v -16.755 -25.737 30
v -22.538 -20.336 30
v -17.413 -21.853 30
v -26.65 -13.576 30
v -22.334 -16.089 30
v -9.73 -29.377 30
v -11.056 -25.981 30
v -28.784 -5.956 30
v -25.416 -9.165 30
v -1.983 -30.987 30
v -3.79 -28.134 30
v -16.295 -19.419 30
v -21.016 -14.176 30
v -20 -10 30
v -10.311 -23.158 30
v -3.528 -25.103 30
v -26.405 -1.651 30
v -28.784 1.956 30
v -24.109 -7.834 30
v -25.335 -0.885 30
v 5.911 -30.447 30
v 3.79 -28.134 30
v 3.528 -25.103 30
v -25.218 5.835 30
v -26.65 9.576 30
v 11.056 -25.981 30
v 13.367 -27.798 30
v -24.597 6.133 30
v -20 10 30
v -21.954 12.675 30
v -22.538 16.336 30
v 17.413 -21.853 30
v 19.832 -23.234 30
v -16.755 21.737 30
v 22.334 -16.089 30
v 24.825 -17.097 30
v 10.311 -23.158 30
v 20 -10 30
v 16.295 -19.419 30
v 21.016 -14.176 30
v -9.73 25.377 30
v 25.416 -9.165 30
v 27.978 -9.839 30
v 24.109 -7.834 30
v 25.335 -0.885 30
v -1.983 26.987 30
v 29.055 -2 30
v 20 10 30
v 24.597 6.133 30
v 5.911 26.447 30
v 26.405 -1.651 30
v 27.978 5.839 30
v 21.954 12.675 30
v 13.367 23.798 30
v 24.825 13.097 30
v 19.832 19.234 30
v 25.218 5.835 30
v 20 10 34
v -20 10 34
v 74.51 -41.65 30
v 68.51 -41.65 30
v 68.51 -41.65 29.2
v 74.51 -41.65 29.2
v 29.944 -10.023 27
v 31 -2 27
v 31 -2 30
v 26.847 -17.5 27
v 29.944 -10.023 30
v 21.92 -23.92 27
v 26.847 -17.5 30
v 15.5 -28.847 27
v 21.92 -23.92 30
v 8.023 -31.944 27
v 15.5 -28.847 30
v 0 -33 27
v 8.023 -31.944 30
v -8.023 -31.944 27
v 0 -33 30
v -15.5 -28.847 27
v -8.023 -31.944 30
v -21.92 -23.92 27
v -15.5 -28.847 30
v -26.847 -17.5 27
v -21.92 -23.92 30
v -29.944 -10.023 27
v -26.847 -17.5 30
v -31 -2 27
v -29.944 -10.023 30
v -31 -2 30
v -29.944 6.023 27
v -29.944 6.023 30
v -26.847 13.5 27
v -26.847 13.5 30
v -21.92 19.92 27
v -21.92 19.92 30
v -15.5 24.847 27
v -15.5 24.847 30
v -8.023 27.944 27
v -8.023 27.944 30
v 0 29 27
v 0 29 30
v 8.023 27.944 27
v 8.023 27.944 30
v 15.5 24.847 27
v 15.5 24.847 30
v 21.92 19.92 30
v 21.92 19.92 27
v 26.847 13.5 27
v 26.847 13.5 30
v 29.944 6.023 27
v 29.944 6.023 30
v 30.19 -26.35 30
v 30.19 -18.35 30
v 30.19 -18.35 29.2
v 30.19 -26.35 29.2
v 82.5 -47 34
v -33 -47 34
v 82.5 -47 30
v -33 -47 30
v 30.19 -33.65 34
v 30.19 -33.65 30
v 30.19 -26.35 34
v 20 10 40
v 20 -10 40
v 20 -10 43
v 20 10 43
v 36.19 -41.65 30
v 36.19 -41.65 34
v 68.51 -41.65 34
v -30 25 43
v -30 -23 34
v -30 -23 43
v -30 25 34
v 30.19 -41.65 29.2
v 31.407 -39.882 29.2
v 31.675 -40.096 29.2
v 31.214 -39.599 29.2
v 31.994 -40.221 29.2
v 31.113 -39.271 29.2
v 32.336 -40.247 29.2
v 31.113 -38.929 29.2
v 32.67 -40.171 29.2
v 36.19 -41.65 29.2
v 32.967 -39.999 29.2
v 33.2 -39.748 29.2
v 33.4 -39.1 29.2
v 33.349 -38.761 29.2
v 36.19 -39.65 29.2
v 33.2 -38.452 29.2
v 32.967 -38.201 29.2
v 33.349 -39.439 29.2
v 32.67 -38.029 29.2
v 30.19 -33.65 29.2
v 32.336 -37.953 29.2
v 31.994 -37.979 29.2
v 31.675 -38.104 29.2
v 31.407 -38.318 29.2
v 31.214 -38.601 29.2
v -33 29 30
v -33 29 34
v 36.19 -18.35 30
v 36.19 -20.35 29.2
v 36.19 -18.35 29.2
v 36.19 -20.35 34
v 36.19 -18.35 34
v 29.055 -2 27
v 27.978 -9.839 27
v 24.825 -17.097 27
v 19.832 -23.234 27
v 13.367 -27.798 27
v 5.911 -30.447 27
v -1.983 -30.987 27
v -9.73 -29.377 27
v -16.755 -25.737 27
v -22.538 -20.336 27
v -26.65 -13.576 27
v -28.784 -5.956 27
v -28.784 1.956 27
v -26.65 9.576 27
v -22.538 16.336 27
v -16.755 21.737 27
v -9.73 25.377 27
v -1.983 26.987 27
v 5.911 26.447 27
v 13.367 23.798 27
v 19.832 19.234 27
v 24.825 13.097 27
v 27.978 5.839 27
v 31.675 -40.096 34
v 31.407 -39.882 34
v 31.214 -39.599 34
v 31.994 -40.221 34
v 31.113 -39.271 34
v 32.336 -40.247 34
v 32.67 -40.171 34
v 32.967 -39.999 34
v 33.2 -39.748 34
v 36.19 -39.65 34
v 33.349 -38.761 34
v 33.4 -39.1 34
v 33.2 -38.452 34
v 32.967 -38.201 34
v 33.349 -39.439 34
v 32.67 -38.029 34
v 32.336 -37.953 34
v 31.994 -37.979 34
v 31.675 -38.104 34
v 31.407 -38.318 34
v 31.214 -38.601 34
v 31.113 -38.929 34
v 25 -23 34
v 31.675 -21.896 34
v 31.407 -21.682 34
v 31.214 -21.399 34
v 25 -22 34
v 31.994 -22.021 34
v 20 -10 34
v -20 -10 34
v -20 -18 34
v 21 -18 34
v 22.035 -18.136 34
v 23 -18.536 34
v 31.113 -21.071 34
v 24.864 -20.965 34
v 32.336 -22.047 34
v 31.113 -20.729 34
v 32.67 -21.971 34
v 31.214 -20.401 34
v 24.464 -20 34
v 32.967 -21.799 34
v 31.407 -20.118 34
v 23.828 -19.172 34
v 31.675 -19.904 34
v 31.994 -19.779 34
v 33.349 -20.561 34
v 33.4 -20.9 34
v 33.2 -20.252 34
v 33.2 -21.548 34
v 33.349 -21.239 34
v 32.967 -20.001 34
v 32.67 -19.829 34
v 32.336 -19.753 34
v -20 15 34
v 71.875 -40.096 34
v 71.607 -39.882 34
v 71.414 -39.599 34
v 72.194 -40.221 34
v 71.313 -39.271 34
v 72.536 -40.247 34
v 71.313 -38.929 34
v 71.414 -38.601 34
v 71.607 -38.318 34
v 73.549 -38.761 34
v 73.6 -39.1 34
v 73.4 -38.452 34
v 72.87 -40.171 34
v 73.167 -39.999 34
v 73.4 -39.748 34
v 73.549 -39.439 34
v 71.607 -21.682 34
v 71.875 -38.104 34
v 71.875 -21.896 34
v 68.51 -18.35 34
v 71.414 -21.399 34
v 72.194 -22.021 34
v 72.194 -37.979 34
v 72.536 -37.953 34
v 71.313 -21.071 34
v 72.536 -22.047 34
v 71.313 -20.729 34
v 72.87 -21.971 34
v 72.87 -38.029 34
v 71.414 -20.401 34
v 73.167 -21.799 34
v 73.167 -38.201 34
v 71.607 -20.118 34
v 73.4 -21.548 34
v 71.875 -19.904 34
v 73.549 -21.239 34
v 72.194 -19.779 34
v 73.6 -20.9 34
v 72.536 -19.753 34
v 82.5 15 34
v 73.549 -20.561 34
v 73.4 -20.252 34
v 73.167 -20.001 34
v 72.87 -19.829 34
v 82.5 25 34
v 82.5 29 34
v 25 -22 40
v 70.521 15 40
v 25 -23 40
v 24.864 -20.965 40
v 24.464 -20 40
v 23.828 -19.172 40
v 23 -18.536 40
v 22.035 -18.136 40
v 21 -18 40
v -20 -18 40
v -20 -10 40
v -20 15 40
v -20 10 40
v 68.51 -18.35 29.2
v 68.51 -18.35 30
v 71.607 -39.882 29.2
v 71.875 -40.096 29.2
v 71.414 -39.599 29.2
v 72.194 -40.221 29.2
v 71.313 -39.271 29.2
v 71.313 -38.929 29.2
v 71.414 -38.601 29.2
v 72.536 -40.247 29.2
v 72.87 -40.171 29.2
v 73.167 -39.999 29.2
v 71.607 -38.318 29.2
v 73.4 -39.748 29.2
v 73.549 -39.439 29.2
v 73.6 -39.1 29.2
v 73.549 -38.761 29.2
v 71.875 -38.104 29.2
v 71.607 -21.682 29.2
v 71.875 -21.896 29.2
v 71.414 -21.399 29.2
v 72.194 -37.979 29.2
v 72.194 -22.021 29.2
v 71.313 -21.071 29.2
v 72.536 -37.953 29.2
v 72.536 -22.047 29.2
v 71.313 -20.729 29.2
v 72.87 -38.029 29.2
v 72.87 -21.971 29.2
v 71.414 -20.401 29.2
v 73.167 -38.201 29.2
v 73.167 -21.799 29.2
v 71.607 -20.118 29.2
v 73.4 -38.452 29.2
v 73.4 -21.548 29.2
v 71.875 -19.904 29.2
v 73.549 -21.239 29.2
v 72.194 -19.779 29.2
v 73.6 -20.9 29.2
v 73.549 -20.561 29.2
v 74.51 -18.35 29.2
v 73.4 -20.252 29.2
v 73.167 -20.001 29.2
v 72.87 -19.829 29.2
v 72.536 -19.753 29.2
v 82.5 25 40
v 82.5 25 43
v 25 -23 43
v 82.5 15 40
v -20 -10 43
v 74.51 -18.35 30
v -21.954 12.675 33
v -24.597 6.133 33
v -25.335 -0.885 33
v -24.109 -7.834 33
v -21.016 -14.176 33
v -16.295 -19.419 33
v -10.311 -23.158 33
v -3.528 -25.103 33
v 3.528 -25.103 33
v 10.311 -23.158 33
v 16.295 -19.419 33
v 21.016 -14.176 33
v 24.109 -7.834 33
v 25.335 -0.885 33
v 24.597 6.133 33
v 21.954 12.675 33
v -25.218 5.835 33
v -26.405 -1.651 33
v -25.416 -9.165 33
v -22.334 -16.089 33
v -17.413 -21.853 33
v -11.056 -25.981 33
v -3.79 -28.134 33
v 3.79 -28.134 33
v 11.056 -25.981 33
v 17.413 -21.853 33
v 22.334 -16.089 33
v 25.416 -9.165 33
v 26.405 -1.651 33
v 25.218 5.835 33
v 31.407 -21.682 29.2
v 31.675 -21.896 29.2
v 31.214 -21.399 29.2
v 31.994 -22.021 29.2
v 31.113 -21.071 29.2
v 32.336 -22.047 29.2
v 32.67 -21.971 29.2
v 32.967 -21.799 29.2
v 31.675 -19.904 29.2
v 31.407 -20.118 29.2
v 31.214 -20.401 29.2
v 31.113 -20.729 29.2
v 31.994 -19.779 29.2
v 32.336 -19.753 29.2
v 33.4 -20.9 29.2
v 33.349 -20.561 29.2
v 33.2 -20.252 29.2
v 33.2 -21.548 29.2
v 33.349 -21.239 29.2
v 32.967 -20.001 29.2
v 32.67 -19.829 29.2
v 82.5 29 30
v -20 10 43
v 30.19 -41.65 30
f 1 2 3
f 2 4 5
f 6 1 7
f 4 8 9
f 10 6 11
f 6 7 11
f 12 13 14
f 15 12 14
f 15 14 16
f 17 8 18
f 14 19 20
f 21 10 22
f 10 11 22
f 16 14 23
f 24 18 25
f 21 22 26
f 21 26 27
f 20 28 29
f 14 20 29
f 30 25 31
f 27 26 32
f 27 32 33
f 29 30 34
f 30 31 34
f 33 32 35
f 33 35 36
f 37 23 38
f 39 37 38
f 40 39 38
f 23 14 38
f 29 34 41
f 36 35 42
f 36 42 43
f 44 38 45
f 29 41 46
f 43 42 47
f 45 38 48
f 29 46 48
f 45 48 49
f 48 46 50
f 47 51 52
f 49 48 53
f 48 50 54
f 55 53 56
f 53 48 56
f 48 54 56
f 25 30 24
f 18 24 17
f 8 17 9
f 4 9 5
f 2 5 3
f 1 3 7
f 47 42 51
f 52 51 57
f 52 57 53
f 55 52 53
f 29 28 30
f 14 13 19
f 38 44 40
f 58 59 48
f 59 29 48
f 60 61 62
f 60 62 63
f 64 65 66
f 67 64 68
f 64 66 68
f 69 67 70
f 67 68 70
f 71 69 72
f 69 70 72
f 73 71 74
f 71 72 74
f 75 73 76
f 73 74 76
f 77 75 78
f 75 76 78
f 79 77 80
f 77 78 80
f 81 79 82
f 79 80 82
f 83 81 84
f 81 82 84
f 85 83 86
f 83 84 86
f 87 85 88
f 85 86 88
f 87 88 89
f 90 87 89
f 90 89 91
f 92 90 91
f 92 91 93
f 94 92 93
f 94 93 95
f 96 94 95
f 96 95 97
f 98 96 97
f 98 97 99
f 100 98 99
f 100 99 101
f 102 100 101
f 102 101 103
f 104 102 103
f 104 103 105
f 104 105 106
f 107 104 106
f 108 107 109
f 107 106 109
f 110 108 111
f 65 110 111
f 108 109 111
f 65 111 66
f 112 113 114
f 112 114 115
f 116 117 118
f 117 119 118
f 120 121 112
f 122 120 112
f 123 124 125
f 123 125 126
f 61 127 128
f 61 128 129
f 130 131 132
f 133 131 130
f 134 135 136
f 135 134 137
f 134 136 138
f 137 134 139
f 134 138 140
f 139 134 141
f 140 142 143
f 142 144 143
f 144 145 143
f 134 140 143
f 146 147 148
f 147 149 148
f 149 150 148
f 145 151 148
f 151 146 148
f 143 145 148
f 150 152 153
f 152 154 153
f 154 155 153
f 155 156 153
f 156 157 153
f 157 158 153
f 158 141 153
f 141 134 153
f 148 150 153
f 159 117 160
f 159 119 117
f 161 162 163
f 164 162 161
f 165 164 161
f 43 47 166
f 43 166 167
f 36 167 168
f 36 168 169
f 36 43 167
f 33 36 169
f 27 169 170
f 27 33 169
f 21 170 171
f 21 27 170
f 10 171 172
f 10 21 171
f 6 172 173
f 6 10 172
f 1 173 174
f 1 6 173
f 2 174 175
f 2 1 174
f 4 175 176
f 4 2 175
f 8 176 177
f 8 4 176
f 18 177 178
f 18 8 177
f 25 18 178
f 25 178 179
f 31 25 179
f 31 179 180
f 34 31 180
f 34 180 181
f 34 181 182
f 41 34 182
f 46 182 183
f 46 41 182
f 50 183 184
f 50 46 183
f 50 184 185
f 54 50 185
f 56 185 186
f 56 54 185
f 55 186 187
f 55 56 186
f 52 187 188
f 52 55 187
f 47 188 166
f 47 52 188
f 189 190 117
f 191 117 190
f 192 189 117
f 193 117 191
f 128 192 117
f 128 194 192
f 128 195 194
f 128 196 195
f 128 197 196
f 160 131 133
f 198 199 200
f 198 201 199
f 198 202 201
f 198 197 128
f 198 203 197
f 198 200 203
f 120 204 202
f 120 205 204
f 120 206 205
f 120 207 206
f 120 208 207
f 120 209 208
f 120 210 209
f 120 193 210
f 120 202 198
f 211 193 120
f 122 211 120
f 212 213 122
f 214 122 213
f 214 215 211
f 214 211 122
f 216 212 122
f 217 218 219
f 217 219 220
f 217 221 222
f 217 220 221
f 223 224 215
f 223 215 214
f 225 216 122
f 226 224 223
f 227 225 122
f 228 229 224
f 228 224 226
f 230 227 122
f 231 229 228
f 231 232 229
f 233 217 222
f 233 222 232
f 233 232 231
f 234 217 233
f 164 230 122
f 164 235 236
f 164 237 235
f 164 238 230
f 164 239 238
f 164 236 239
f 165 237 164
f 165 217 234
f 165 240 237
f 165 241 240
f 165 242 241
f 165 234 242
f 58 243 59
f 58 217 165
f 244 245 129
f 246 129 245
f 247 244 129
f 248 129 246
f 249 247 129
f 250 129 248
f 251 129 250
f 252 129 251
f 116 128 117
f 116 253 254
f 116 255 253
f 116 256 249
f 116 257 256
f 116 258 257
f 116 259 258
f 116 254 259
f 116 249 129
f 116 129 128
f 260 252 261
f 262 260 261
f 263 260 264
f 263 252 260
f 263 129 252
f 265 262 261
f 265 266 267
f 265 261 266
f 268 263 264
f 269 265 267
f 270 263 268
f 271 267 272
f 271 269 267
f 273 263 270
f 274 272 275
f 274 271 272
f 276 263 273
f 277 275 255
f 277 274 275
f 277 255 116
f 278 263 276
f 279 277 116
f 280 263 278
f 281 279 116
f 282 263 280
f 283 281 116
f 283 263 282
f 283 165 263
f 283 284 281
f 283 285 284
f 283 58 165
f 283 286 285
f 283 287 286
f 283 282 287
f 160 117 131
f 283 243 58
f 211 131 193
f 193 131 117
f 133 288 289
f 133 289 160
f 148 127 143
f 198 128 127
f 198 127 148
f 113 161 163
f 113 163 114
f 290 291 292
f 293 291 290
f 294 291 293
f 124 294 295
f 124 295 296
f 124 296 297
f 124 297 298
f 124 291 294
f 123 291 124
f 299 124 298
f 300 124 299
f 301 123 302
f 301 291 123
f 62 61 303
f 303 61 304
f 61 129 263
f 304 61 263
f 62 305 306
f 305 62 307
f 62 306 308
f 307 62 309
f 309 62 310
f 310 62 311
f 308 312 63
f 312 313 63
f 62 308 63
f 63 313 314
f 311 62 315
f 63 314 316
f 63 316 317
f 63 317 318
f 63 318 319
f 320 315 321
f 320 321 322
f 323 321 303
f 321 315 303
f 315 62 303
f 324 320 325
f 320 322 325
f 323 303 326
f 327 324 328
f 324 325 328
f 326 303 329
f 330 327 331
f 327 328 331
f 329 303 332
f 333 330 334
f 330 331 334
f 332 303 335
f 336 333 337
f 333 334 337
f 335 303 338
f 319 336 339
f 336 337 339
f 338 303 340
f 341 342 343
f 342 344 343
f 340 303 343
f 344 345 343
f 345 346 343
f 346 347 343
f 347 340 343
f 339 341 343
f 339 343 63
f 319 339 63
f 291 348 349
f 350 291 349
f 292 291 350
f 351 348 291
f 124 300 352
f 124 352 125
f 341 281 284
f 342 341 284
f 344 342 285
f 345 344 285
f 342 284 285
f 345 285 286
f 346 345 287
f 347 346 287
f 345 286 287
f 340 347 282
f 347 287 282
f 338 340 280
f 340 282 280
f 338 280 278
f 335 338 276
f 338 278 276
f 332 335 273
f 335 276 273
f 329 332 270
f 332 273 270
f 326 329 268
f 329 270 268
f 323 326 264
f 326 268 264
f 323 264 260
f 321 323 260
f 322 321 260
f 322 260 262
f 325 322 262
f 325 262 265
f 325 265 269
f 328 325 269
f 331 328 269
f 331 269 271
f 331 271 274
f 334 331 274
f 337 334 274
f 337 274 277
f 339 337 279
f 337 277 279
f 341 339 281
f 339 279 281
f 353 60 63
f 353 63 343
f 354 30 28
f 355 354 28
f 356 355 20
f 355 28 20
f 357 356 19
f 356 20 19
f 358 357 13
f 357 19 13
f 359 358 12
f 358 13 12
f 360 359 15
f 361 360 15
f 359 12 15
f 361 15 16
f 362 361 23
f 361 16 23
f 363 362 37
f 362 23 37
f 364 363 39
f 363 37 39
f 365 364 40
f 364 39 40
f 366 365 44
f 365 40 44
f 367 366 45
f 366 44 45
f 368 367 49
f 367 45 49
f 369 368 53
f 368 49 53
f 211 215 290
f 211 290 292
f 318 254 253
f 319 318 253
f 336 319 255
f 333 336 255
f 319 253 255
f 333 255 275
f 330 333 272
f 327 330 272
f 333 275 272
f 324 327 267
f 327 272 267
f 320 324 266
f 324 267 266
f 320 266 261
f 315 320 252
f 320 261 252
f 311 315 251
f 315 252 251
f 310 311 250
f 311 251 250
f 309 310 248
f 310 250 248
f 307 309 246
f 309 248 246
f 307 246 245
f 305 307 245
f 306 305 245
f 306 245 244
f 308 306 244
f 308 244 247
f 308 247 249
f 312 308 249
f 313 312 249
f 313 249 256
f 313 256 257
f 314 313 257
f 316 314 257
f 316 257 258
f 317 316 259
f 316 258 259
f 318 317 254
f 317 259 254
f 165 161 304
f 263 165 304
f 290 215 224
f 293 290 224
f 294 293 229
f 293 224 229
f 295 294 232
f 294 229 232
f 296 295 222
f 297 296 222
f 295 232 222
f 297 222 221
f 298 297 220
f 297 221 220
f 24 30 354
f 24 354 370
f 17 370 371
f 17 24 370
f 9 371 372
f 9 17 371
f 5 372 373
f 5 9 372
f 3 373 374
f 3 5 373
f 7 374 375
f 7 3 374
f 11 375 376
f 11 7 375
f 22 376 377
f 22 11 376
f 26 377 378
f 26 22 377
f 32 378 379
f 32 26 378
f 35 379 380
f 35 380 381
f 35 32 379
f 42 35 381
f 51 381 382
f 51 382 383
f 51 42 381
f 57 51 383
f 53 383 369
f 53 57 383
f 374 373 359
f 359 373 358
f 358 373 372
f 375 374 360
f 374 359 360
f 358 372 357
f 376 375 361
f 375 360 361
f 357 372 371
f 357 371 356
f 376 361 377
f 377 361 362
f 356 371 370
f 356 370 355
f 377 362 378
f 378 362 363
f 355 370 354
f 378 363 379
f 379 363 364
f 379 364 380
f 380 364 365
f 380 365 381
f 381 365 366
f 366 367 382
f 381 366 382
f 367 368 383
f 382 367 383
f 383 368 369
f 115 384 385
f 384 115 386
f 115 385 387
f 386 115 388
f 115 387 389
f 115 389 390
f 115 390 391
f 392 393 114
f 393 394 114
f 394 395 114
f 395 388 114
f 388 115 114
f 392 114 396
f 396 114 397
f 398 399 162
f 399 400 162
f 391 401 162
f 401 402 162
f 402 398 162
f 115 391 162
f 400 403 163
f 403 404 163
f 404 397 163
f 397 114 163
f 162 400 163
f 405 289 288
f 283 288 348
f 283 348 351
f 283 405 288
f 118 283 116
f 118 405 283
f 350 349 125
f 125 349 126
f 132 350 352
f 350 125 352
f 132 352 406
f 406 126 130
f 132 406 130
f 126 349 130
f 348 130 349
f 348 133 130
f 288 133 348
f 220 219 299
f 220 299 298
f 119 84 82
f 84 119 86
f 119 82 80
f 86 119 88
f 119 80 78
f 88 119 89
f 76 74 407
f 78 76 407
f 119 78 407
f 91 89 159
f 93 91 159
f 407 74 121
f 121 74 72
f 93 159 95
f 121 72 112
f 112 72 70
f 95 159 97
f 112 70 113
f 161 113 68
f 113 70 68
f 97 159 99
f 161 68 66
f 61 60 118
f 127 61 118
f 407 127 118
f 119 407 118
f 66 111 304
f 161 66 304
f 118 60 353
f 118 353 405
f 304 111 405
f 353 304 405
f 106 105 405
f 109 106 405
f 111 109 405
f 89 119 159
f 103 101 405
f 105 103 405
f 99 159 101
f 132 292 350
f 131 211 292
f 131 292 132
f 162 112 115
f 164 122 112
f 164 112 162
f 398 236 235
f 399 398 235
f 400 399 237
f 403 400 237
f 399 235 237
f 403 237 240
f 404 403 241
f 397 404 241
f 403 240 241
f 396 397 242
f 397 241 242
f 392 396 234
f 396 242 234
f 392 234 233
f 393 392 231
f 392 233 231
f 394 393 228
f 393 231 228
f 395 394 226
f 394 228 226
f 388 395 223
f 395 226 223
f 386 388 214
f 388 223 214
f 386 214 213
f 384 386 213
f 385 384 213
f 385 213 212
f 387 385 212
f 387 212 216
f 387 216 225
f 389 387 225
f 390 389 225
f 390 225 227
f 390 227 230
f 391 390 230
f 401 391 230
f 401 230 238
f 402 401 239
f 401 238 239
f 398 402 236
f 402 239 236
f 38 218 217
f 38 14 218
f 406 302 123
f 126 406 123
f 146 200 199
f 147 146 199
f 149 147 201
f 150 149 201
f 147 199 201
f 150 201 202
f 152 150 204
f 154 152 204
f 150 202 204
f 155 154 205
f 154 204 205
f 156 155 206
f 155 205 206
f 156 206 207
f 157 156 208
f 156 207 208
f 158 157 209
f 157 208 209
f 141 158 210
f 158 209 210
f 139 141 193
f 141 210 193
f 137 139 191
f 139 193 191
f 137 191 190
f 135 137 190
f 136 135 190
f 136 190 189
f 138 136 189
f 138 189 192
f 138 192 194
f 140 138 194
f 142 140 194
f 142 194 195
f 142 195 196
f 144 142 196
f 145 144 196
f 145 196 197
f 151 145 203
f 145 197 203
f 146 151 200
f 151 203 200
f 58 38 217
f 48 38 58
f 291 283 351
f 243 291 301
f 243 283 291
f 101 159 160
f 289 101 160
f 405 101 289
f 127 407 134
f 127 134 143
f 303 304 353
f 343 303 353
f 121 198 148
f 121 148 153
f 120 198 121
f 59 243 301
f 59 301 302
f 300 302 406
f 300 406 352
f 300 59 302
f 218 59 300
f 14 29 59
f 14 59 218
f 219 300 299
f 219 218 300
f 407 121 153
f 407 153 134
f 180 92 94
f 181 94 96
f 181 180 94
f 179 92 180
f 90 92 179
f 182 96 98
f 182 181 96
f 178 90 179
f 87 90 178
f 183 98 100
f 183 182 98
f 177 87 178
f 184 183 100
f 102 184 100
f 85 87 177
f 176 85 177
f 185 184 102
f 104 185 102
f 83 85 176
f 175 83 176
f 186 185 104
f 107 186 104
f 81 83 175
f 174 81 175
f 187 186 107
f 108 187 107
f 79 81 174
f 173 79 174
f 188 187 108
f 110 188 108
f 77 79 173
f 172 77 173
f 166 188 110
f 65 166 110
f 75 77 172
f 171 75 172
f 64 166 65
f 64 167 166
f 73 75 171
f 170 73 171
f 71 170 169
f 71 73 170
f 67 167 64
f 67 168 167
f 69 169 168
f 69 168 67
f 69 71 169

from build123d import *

# Parameters (mm, degrees)
SKETCH005_W     = 115.5
SKETCH005_H     = 76
PAD005_DEPTH    = 3
SKETCH006_W     = 115.5
SKETCH006_H     = 76
SKETCH006_W_2   = 40
SKETCH006_H_2   = 20
SKETCH006_W_3   = 44.32
SKETCH006_H_3   = 23.3
PAD006_DEPTH    = 1
PAD006_FACE22_W = 23.3
PAD006_FACE22_H = 44.32
POCKET_DEPTH    = 3.001
POCKET_FACE26_W = 20
POCKET_FACE26_H = 40
POCKET010_DEPTH = 3.001
SKETCH007_R     = 31
SKETCH007_R_2   = 29.055
PAD007_DEPTH    = 3
SKETCH035_R     = 1.15
SKETCH035_W     = 6
SKETCH035_H     = 23.3
PAD031_DEPTH    = 4.8
PAD013_DEPTH    = 6
SKETCH014_W     = 40
SKETCH014_H     = 20
PAD014_DEPTH    = 3


with BuildPart() as part:
    # Sketch005 → Pad005 (new body)
    with BuildSketch(Plane.XY):
        with Locations((24.75, -9)):
            Rectangle(SKETCH005_W, SKETCH005_H)
        with BuildLine():
            ThreePointArc((-21.953744, 12.675), (0, -25.35), (21.953744, 12.675))
            ThreePointArc((-21.953744, 12.675), (0, -28.406865), (21.953744, 12.675))
        make_face(mode=Mode.SUBTRACT)
    extrude(amount=PAD005_DEPTH)

    # Sketch006 (on Face8 of Pad005) → Pad006 (join)
    with BuildSketch(Plane.XY.offset(3)):
        with Locations((24.75, -9)):
            Rectangle(SKETCH006_W, SKETCH006_H)
        Rectangle(SKETCH006_W_2, SKETCH006_H_2, mode=Mode.SUBTRACT)
        with Locations((52.35, -30)):
            Rectangle(SKETCH006_W_3, SKETCH006_H_3, mode=Mode.SUBTRACT)
    extrude(amount=PAD006_DEPTH)

    # Pad006 Face22 → Pocket (cut, through all)
    with BuildSketch(Plane(origin=(52.35, -30, 3), x_dir=(0, 1, 0), z_dir=(0, 0, 1))):
        Rectangle(PAD006_FACE22_W, PAD006_FACE22_H)
    extrude(amount=-POCKET_DEPTH, mode=Mode.SUBTRACT)

    # Pocket Face26 → Pocket010 (cut, through all)
    with BuildSketch(Plane(origin=(0, 0, 3), x_dir=(0, 1, 0), z_dir=(0, 0, 1))):
        Rectangle(POCKET_FACE26_W, POCKET_FACE26_H)
    extrude(amount=-POCKET010_DEPTH, mode=Mode.SUBTRACT)

    # Sketch007 (on Face4 of Pocket) → Pad007 (join)
    with BuildSketch(Plane(origin=(0, 0, 0), x_dir=(1, 0, 0), z_dir=(0, 0, -1))):
        with Locations((0, 2)):
            Circle(SKETCH007_R)
        with Locations((0, 2)):
            Circle(SKETCH007_R_2, mode=Mode.SUBTRACT)
    extrude(amount=PAD007_DEPTH)

    # Sketch035 (on Face14 of Pad007) → Pad031 (join)
    with BuildSketch(Plane.XY.offset(4)):
        Polygon((30.19, -18.35), (30.19, -26.35), (36.19, -20.35), (36.19, -18.35), align=None)
        with Locations((32.25, -20.9)):
            Circle(SKETCH035_R, mode=Mode.SUBTRACT)
        Polygon((30.19, -41.65), (36.19, -41.65), (36.19, -39.65), (30.19, -33.65), align=None)
        with Locations((32.25, -39.1)):
            Circle(SKETCH035_R, mode=Mode.SUBTRACT)
        with Locations((71.51, -30)):
            Rectangle(SKETCH035_W, SKETCH035_H)
        with Locations((72.45, -20.9)):
            Circle(SKETCH035_R, mode=Mode.SUBTRACT)
        with Locations((72.45, -39.1)):
            Circle(SKETCH035_R, mode=Mode.SUBTRACT)
    extrude(amount=-PAD031_DEPTH)

    # Sketch013 (on Face14 of Pad007) → Pad013 (join)
    with BuildSketch(Plane.XY.offset(4)):
        with BuildLine():
            Line((82.5, 25), (82.5, 15))
            Line((82.5, 15), (-20, 15))
            Line((-20, 15), (-20, -18))
            Line((-20, -18), (21, -18))
            ThreePointArc((25, -22), (23.828427, -19.171573), (21, -18))
            Line((25, -22), (25, -23))
            Line((25, -23), (-30, -23))
            Line((-30, -23), (-30, 25))
            Line((-30, 25), (82.5, 25))
        make_face()
    extrude(amount=PAD013_DEPTH)

    # Sketch014 (on Face49 of Pad013) → Pad014 (join)
    with BuildSketch(Plane.XY.offset(10)):
        Polygon((82.5, 25), (25, -23), (-30, -23), (-30, 25), align=None)
        Rectangle(SKETCH014_W, SKETCH014_H, mode=Mode.SUBTRACT)
    extrude(amount=PAD014_DEPTH)


with BuildPart() as part_1:
    # Body002 placement: moved
    add(part.part.moved(Location((0, 0, 30))))


solid = part_1.part
